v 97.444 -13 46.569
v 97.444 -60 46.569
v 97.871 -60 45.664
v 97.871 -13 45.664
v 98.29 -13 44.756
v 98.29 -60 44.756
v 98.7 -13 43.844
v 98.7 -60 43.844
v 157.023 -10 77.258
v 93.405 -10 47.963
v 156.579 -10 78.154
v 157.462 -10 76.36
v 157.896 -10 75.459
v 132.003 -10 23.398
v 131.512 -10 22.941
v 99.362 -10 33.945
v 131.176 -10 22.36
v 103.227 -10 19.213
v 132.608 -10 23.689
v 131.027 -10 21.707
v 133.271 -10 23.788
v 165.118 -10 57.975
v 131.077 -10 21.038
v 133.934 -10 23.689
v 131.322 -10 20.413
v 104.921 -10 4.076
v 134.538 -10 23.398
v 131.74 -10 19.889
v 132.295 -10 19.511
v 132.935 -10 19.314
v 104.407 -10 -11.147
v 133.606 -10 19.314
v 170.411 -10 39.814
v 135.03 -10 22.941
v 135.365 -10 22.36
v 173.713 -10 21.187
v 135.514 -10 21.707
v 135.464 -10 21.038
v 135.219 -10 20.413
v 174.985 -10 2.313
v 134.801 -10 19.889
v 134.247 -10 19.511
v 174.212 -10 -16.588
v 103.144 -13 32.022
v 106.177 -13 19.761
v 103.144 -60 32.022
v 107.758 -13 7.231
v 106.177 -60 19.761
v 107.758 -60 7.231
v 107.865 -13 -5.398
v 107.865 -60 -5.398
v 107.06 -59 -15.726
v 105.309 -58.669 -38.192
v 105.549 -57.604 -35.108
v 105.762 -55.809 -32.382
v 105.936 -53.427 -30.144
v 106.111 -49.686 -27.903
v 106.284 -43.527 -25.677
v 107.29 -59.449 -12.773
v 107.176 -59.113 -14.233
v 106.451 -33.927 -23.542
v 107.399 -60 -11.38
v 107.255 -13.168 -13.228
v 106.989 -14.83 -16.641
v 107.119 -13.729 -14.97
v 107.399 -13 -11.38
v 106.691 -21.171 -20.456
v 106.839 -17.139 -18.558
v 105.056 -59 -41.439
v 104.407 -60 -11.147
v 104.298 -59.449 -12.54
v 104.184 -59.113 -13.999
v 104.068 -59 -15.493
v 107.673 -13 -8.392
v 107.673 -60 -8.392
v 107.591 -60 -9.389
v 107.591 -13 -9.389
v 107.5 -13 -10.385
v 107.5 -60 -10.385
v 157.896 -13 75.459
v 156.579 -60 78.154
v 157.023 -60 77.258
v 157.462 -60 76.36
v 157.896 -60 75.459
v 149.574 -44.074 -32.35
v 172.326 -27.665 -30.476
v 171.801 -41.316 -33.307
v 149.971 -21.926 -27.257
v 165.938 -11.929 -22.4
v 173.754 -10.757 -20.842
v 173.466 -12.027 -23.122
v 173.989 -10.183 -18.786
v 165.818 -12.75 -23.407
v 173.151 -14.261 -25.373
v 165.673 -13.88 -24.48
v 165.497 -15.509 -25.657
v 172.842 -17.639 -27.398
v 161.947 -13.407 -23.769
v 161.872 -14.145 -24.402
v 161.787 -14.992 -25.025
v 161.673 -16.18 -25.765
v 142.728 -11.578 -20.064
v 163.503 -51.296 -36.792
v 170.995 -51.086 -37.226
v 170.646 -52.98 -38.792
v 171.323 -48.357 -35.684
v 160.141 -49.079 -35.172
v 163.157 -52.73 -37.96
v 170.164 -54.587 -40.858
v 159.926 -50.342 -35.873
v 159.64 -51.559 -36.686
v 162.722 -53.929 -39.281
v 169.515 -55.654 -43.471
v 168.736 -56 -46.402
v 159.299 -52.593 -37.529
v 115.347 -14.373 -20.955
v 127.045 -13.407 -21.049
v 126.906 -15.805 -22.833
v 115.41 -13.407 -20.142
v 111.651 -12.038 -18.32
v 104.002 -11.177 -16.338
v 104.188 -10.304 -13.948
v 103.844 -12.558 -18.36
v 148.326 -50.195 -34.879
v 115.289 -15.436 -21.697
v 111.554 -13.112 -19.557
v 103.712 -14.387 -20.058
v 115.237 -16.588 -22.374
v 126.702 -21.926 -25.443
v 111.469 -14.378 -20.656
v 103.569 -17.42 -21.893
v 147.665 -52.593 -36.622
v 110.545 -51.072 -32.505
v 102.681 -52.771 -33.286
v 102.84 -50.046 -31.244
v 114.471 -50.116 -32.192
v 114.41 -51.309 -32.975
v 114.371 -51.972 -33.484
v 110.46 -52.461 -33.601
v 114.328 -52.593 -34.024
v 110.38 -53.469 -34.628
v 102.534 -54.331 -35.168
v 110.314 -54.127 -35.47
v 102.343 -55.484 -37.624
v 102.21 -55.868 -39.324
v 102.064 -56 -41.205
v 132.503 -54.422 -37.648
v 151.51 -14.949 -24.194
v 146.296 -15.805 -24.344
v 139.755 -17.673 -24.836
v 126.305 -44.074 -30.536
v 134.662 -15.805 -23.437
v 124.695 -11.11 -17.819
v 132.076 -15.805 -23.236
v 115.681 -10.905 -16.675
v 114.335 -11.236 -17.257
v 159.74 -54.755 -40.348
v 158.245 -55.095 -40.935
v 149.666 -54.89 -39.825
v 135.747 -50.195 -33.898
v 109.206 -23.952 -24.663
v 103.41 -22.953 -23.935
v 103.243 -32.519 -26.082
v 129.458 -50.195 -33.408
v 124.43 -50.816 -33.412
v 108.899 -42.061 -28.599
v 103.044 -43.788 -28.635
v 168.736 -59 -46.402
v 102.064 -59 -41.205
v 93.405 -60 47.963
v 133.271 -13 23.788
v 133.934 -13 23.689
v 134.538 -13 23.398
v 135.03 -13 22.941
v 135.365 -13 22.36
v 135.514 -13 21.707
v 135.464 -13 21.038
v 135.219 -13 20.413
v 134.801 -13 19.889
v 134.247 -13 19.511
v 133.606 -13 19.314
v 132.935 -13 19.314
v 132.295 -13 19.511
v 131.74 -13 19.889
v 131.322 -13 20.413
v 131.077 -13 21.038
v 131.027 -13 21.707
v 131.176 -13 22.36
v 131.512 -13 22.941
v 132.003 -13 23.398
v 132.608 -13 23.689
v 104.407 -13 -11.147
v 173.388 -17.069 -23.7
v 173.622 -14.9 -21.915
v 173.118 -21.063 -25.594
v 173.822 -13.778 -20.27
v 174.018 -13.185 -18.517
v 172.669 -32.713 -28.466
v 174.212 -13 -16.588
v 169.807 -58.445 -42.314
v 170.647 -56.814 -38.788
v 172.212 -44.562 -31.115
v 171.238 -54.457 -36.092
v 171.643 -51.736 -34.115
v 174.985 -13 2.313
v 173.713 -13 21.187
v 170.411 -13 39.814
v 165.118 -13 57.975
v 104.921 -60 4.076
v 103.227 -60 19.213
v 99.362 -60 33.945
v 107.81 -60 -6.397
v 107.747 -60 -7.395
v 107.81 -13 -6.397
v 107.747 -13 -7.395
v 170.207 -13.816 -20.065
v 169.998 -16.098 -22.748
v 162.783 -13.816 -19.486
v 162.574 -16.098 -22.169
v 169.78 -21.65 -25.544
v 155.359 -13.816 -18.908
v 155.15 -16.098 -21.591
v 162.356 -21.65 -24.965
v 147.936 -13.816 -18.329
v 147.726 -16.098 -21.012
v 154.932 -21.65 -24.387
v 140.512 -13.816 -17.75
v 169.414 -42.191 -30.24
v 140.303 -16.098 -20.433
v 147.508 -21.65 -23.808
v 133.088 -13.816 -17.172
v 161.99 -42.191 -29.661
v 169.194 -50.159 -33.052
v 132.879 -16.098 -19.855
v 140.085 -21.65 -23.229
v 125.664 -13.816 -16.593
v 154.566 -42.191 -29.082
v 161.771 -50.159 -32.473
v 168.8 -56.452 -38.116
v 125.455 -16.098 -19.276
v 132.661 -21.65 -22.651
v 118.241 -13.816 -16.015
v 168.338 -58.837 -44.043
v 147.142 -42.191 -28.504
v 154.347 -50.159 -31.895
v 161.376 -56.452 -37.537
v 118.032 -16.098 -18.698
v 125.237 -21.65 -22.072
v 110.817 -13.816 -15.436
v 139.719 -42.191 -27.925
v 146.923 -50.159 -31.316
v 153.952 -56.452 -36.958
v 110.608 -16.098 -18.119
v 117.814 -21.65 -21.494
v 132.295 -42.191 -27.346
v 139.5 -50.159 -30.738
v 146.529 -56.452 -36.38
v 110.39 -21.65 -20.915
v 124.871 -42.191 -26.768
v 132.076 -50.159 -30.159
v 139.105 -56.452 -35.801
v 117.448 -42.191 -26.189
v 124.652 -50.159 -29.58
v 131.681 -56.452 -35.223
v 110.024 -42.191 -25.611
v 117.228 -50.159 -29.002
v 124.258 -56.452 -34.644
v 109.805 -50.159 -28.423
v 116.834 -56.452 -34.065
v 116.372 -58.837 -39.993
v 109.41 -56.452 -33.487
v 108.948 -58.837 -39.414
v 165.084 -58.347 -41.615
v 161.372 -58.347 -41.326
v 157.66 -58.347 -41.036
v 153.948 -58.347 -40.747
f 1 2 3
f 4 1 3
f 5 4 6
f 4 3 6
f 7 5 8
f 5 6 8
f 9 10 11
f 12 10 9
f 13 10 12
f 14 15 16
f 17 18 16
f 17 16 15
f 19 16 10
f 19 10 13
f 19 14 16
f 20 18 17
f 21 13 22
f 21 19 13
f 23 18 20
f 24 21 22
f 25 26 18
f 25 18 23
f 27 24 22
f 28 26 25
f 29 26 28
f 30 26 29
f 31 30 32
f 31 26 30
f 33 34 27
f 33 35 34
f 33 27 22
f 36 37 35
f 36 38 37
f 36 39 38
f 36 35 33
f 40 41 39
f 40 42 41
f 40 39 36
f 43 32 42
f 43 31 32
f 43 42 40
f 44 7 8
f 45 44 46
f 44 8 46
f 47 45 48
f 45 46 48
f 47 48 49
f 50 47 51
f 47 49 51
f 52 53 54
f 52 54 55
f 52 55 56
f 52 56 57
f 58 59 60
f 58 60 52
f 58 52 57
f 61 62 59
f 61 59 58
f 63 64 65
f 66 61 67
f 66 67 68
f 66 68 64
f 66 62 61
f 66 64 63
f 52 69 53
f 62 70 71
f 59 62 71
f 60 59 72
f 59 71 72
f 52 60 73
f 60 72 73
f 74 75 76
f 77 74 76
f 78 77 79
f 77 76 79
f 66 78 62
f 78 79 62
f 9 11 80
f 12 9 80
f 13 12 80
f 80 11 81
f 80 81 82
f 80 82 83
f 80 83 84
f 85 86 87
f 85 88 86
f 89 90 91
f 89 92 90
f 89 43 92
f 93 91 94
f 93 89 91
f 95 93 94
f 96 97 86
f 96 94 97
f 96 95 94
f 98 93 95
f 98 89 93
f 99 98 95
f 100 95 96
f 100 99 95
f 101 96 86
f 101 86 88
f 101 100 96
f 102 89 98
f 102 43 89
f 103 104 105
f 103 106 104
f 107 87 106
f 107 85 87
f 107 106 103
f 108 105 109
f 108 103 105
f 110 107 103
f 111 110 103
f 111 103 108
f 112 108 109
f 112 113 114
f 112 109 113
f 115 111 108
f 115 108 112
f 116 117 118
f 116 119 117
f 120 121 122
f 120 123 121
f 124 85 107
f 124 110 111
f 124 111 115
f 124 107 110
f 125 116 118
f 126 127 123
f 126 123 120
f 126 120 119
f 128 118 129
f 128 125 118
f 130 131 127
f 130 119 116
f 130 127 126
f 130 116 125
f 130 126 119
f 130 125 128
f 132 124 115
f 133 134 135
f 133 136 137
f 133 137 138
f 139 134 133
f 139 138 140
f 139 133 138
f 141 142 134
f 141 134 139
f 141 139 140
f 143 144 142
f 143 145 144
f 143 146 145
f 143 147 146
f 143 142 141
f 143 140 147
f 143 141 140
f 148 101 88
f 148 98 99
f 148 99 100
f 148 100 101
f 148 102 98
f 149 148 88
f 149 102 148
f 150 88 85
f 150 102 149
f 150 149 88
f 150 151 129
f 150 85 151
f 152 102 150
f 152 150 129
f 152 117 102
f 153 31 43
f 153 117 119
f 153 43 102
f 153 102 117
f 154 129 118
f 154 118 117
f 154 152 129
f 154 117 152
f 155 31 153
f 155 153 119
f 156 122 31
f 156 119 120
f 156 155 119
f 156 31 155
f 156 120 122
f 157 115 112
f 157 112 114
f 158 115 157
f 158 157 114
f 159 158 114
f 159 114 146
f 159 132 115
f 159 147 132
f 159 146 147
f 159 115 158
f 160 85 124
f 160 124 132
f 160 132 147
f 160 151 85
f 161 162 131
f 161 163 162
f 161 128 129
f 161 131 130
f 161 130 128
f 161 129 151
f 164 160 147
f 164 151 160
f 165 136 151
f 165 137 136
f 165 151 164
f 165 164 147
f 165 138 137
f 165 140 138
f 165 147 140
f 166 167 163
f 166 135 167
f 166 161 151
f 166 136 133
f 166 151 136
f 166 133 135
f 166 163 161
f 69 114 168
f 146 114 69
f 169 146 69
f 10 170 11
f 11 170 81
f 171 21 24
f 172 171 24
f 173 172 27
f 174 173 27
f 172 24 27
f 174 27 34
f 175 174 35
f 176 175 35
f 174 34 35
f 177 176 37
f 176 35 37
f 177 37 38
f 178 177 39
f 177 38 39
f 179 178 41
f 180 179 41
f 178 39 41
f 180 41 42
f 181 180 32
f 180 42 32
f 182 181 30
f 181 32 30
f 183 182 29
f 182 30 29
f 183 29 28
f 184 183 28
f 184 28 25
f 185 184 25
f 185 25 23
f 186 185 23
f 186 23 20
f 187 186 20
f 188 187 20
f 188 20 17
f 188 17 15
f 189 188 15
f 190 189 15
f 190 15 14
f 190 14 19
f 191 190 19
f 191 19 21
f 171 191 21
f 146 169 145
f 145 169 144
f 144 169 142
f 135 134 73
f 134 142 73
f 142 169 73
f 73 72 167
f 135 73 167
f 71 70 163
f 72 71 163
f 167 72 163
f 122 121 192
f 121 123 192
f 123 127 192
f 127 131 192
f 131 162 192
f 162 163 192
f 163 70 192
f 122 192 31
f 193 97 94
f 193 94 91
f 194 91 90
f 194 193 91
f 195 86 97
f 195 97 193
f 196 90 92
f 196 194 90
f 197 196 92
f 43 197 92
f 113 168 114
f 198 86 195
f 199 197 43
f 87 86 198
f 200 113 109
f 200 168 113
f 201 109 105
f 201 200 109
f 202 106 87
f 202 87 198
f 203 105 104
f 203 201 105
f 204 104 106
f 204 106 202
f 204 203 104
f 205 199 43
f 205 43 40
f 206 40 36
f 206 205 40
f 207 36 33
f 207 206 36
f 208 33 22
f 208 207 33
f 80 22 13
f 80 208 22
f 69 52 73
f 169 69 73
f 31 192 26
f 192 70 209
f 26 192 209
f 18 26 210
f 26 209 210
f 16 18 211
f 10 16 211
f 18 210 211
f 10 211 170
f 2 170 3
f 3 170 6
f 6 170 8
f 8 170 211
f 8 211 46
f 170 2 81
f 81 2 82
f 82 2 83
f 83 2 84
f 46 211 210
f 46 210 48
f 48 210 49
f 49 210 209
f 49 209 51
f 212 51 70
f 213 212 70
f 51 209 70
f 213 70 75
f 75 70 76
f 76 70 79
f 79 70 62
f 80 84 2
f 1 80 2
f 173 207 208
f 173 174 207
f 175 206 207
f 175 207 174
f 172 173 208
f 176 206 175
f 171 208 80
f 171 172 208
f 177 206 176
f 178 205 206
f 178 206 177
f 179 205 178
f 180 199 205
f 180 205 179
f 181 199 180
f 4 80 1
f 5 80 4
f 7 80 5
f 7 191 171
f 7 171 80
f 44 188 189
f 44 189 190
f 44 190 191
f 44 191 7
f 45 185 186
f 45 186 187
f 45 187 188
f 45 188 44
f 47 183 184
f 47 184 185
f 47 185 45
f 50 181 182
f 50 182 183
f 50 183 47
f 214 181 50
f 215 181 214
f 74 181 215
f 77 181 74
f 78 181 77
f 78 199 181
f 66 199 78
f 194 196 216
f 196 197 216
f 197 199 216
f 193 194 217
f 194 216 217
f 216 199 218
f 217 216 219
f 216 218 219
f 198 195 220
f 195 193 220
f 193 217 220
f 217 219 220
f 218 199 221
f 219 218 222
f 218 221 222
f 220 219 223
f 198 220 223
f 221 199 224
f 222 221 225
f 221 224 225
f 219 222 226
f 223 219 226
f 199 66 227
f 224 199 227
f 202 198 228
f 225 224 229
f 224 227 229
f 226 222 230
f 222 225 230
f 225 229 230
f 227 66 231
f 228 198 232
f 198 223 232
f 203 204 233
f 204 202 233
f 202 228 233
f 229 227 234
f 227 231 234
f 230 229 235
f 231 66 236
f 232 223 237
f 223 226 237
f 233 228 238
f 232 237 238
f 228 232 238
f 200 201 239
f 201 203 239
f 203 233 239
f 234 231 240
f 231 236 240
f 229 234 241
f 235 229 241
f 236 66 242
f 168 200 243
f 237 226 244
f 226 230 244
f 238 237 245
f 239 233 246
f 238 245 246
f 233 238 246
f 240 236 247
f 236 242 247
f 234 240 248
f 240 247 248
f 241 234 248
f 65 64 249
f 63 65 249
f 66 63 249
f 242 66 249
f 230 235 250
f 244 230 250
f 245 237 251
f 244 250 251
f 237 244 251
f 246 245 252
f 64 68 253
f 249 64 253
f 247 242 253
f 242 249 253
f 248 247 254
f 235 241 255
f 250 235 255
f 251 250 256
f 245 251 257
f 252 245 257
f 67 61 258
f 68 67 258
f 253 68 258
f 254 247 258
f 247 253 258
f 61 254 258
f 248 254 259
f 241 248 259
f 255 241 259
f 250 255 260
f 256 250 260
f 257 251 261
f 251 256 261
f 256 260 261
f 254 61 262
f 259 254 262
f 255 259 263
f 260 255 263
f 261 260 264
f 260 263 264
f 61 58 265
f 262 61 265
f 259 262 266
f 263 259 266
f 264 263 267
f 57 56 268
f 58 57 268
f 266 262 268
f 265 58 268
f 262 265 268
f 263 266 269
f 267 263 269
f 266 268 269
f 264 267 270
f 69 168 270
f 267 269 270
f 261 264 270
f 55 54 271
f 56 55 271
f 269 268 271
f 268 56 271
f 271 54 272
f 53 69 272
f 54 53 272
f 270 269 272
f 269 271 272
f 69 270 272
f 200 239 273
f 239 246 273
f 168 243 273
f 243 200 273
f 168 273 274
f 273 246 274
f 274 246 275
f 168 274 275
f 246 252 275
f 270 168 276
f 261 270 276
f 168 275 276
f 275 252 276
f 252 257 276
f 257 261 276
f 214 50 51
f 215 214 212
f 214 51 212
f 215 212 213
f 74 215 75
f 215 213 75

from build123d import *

# Parameters (mm, degrees)
SKETCH2_R                 = 178
SKETCH2_R_2               = 100
BOSS_EXTRUDE1_DEPTH       = 3
SKETCH3_R                 = 178
SKETCH3_R_2               = 175
BOSS_EXTRUDE2_DEPTH       = 60
CUT_EXTRUDE2_START        = -25
CUT_EXTRUDE2_DEPTH        = 25
BOSS_EXTRUDE4_START       = -50
BOSS_EXTRUDE4_DEPTH       = 50
BOSS_EXTRUDE5_START       = 3
BOSS_EXTRUDE5_DEPTH       = 3
BOSS_EXTRUDE15_REACH      = 346.25
BOSS_EXTRUDE15_END_RADIUS = 175
BOSS_EXTRUDE16_REACH      = 263.713
SKETCH15_W                = 3.001191186
SKETCH15_H                = 49
FILLET2_START             = 104.957134107
FILLET2_DEPTH             = 3.001191186
SKETCH16_R                = 178
CUT_EXTRUDE3_DEPTH        = 73
CUT_EXTRUDE4_REACH        = 200.073
SKETCH17_R                = 2.25


with BuildPart() as part:
    # Sketch2 → Boss-Extrude1 (new body)
    with BuildSketch(Plane(origin=(0, 0, 0), x_dir=(1, 0, 0), z_dir=(0, 1, 0))):
        with Locations(Location((0, 0, 0), (0, 0, 270))):
            Circle(SKETCH2_R)
        with Locations(Location((0, 0, 0), (0, 0, 270))):
            Circle(SKETCH2_R_2, mode=Mode.SUBTRACT)
    extrude(amount=BOSS_EXTRUDE1_DEPTH)

    # Sketch3 → Boss-Extrude2 (add)
    with BuildSketch(Plane(origin=(0, 3, 0), x_dir=(1, 0, 0), z_dir=(0, 1, 0))):
        with Locations(Location((0, 0, 0), (0, 0, 270))):
            Circle(SKETCH3_R)
        with Locations(Location((0, 0, 0), (0, 0, 270))):
            Circle(SKETCH3_R_2, mode=Mode.SUBTRACT)
    extrude(amount=BOSS_EXTRUDE2_DEPTH)

    # Sketch5 → Cut-Extrude2 (cut)
    with BuildSketch(Plane(origin=(0, 3, 0), x_dir=(1, 0, 0), z_dir=(0, 1, 0)).offset(CUT_EXTRUDE2_START)):
        with BuildLine():
            Line((174.470835958, 13.59880142), (99.697620548, 7.770743669))
            ThreePointArc((99.697620548, 7.770743669), (99.924376542, 3.888312311), (100, 0))
            ThreePointArc((100, 0), (97.525905257, -22.106510438), (90.226043925, -43.11914885))
            Line((90.226043925, -43.11914885), (157.895576869, -75.458510488))
            ThreePointArc((157.895576869, -75.458510488), (170.6703342, -38.686393266), (175, 0))
            ThreePointArc((175, 0), (174.867658949, 6.804546543), (174.470835958, 13.59880142))
        make_face()
    extrude(amount=CUT_EXTRUDE2_DEPTH, mode=Mode.SUBTRACT)

    # Sketch16 → Cut-Extrude3 (cut)
    with BuildSketch(Plane(origin=(0, -10, 0), x_dir=(1, 0, 0), z_dir=(0, 1, 0))):
        Circle(SKETCH16_R)
    extrude(amount=CUT_EXTRUDE3_DEPTH, mode=Mode.SUBTRACT)


with BuildPart() as body_2:
    # Sketch8 → Boss-Extrude4 (new body)
    with BuildSketch(Plane(origin=(0, -10, 0), x_dir=(1, 0, 0), z_dir=(0, 1, 0)).offset(BOSS_EXTRUDE4_START)):
        with BuildLine():
            Line((157.895576869, -75.458510488), (97.444127439, -46.568680758))
            ThreePointArc((97.444127439, -46.568680758), (98.081576263, -45.210666859), (98.700100465, -43.843929662))
            ThreePointArc((98.700100465, -43.843929662), (106.176660799, -19.761495426), (107.86500381, 5.398236111))
            ThreePointArc((107.86500381, 5.398236111), (107.779614919, 6.895984919), (107.673430191, 8.392403162))
            ThreePointArc((107.673430191, 8.392403162), (107.546470116, 9.88720211), (107.39875919, 11.380093344))
            Line((107.39875919, 11.380093344), (104.40664299, 11.14687847))
            ThreePointArc((104.40664299, 11.14687847), (103.227309111, -19.212564998), (93.405095457, -47.963404203))
            Line((93.405095457, -47.963404203), (156.578799716, -78.15420321))
            ThreePointArc((156.578799716, -78.15420321), (157.242965096, -76.80917867), (157.895576869, -75.458510488))
        make_face()
    extrude(amount=BOSS_EXTRUDE4_DEPTH)

    # Sketch9 → Boss-Extrude5 (add)
    with BuildSketch(Plane(origin=(0, -10, 0), x_dir=(-1, 0, 0), z_dir=(0, -1, 0)).offset(BOSS_EXTRUDE5_START)):
        with BuildLine():
            ThreePointArc((-93.405095457, -47.963404203), (-103.227309111, -19.212564998), (-104.40664299, 11.14687847))
            Line((-104.40664299, 11.14687847), (-174.212075233, 16.587731699))
            ThreePointArc((-174.212075233, 16.587731699), (-172.045515184, -32.020941663), (-156.578799716, -78.15420321))
            Line((-156.578799716, -78.15420321), (-93.405095457, -47.963404203))
        make_face()
    extrude(amount=-BOSS_EXTRUDE5_DEPTH)


with BuildPart() as body_3:
    # Boss-Extrude15: up to this cylinder (the profile starts inside it)
    boss_extrude15_end = Plane(origin=(0, -35.052685, 0), z_dir=(0, -1, 0)) * Cylinder(BOSS_EXTRUDE15_END_RADIUS, 1043.5, mode=Mode.PRIVATE)
    # Sketch14 → Boss-Extrude15 (new, up to the surface)
    with BuildSketch(Plane(origin=(104.6397653, 0, -8.155949853), x_dir=(0, 1, 0), z_dir=(0.9969762054751131, 0, -0.07770743668687732)), mode=Mode.PRIVATE) as boss_extrude15_sk1:
        with BuildLine():
            Line((-56, -33.149626863), (-59, -33.149626863))
            add(Edge.make_bspline(
                [(-13, -3), (-13, -3.252742632), (-13.017835017, -3.772139773), (-13.118535688, -4.696081698), (-13.354753506, -5.728289796), (-13.790711815, -6.796346653), (-14.57235228, -8.073596542), (-15.969031451, -9.501150583), (-18.417965946, -11.02187183), (-21.560218655, -12.309547439), (-26.464579206, -13.73861764), (-33.523749843, -15.121678766), (-42.302010507, -16.833830818), (-49.062318848, -19.008877457), (-53.702980916, -21.83051429), (-56.611293913, -24.732512094), (-58.237380526, -27.905736518), (-58.80960896, -30.443459169), (-58.972930909, -31.962804263), (-59, -32.756631085), (-59, -33.149626863)],
                knots=[0, 0, 0, 0, 0.015625, 0.03125, 0.0625, 0.09375, 0.125, 0.1875, 0.25, 0.3125, 0.375, 0.5, 0.625, 0.75, 0.8125, 0.875, 0.9375, 0.96875, 0.984375, 1, 1, 1, 1], degree=3))
            Line((-13, -3), (-10, -3))
            add(Edge.make_bspline(
                [(-10, -3), (-10, -24.167074489), (-56, -11.982552374), (-56, -33.149626863)],
                knots=[0, 0, 0, 0, 1, 1, 1, 1], degree=3))
        make_face()
    boss_extrude15_tool1 = extrude(boss_extrude15_sk1.sketch, amount=BOSS_EXTRUDE15_REACH, mode=Mode.PRIVATE) & boss_extrude15_end
    add(boss_extrude15_tool1.solids().sort_by_distance((103.281222, -35.052685, -25.585884))[0])

    # Sketch15 → Boss-Extrude16 (add, up to next)
    with BuildSketch(Plane(origin=(-0.23312231, 0, -2.990928616), x_dir=(-0.9969762054751131, 0, 0.07770743668687734), z_dir=(-0.07770743668687734, 0, -0.9969762054751131)), mode=Mode.PRIVATE) as boss_extrude16_sk1:
        with Locations((-106.4577297, -34.5)):
            Rectangle(SKETCH15_W, SKETCH15_H)
    boss_extrude16_tool1 = extrude(boss_extrude16_sk1.sketch, amount=BOSS_EXTRUDE16_REACH, mode=Mode.PRIVATE) - body_3.part

    add(body_2.part)  # Boss-Extrude16 merges body 2
    add(boss_extrude16_tool1.solids().sort_by_distance((105.902701, -34.5, -11.263486))[0])

    # Fillet2: read off the stored shape, not the designer's step
    # Fillet2 outline → Fillet2 (add)
    with BuildSketch(Plane(origin=(0, 0, 0), x_dir=(0, 1, 0), z_dir=(0.9969762054751131, 0, -0.07770743668687731)).offset(FILLET2_START)):
        with BuildLine():
            Line((-59, -3), (-60, -3))
            ThreePointArc((-60, -3), (-59.253205655, -5.122830966), (-59, -7.358898944))
            Line((-59, -7.358898944), (-59, -3))
        make_face()
    extrude(amount=FILLET2_DEPTH)

    # Sketch17 → Cut-Extrude4 (cut, up to next)
    with BuildSketch(Plane(origin=(0, -10, 0), x_dir=(1, 0, 0), z_dir=(0, 1, 0)), mode=Mode.PRIVATE) as cut_extrude4_sk1:
        with Locations(Location((133.270755038, -21.538473754, 0), (0, 0, 270))):
            Circle(SKETCH17_R)
    cut_extrude4_tool1 = extrude(cut_extrude4_sk1.sketch, amount=-CUT_EXTRUDE4_REACH, mode=Mode.PRIVATE) & body_3.part
    add(cut_extrude4_tool1.solids().sort_by_distance((133.270755, -10, 21.538474))[0], mode=Mode.SUBTRACT)


solid = body_3.part
